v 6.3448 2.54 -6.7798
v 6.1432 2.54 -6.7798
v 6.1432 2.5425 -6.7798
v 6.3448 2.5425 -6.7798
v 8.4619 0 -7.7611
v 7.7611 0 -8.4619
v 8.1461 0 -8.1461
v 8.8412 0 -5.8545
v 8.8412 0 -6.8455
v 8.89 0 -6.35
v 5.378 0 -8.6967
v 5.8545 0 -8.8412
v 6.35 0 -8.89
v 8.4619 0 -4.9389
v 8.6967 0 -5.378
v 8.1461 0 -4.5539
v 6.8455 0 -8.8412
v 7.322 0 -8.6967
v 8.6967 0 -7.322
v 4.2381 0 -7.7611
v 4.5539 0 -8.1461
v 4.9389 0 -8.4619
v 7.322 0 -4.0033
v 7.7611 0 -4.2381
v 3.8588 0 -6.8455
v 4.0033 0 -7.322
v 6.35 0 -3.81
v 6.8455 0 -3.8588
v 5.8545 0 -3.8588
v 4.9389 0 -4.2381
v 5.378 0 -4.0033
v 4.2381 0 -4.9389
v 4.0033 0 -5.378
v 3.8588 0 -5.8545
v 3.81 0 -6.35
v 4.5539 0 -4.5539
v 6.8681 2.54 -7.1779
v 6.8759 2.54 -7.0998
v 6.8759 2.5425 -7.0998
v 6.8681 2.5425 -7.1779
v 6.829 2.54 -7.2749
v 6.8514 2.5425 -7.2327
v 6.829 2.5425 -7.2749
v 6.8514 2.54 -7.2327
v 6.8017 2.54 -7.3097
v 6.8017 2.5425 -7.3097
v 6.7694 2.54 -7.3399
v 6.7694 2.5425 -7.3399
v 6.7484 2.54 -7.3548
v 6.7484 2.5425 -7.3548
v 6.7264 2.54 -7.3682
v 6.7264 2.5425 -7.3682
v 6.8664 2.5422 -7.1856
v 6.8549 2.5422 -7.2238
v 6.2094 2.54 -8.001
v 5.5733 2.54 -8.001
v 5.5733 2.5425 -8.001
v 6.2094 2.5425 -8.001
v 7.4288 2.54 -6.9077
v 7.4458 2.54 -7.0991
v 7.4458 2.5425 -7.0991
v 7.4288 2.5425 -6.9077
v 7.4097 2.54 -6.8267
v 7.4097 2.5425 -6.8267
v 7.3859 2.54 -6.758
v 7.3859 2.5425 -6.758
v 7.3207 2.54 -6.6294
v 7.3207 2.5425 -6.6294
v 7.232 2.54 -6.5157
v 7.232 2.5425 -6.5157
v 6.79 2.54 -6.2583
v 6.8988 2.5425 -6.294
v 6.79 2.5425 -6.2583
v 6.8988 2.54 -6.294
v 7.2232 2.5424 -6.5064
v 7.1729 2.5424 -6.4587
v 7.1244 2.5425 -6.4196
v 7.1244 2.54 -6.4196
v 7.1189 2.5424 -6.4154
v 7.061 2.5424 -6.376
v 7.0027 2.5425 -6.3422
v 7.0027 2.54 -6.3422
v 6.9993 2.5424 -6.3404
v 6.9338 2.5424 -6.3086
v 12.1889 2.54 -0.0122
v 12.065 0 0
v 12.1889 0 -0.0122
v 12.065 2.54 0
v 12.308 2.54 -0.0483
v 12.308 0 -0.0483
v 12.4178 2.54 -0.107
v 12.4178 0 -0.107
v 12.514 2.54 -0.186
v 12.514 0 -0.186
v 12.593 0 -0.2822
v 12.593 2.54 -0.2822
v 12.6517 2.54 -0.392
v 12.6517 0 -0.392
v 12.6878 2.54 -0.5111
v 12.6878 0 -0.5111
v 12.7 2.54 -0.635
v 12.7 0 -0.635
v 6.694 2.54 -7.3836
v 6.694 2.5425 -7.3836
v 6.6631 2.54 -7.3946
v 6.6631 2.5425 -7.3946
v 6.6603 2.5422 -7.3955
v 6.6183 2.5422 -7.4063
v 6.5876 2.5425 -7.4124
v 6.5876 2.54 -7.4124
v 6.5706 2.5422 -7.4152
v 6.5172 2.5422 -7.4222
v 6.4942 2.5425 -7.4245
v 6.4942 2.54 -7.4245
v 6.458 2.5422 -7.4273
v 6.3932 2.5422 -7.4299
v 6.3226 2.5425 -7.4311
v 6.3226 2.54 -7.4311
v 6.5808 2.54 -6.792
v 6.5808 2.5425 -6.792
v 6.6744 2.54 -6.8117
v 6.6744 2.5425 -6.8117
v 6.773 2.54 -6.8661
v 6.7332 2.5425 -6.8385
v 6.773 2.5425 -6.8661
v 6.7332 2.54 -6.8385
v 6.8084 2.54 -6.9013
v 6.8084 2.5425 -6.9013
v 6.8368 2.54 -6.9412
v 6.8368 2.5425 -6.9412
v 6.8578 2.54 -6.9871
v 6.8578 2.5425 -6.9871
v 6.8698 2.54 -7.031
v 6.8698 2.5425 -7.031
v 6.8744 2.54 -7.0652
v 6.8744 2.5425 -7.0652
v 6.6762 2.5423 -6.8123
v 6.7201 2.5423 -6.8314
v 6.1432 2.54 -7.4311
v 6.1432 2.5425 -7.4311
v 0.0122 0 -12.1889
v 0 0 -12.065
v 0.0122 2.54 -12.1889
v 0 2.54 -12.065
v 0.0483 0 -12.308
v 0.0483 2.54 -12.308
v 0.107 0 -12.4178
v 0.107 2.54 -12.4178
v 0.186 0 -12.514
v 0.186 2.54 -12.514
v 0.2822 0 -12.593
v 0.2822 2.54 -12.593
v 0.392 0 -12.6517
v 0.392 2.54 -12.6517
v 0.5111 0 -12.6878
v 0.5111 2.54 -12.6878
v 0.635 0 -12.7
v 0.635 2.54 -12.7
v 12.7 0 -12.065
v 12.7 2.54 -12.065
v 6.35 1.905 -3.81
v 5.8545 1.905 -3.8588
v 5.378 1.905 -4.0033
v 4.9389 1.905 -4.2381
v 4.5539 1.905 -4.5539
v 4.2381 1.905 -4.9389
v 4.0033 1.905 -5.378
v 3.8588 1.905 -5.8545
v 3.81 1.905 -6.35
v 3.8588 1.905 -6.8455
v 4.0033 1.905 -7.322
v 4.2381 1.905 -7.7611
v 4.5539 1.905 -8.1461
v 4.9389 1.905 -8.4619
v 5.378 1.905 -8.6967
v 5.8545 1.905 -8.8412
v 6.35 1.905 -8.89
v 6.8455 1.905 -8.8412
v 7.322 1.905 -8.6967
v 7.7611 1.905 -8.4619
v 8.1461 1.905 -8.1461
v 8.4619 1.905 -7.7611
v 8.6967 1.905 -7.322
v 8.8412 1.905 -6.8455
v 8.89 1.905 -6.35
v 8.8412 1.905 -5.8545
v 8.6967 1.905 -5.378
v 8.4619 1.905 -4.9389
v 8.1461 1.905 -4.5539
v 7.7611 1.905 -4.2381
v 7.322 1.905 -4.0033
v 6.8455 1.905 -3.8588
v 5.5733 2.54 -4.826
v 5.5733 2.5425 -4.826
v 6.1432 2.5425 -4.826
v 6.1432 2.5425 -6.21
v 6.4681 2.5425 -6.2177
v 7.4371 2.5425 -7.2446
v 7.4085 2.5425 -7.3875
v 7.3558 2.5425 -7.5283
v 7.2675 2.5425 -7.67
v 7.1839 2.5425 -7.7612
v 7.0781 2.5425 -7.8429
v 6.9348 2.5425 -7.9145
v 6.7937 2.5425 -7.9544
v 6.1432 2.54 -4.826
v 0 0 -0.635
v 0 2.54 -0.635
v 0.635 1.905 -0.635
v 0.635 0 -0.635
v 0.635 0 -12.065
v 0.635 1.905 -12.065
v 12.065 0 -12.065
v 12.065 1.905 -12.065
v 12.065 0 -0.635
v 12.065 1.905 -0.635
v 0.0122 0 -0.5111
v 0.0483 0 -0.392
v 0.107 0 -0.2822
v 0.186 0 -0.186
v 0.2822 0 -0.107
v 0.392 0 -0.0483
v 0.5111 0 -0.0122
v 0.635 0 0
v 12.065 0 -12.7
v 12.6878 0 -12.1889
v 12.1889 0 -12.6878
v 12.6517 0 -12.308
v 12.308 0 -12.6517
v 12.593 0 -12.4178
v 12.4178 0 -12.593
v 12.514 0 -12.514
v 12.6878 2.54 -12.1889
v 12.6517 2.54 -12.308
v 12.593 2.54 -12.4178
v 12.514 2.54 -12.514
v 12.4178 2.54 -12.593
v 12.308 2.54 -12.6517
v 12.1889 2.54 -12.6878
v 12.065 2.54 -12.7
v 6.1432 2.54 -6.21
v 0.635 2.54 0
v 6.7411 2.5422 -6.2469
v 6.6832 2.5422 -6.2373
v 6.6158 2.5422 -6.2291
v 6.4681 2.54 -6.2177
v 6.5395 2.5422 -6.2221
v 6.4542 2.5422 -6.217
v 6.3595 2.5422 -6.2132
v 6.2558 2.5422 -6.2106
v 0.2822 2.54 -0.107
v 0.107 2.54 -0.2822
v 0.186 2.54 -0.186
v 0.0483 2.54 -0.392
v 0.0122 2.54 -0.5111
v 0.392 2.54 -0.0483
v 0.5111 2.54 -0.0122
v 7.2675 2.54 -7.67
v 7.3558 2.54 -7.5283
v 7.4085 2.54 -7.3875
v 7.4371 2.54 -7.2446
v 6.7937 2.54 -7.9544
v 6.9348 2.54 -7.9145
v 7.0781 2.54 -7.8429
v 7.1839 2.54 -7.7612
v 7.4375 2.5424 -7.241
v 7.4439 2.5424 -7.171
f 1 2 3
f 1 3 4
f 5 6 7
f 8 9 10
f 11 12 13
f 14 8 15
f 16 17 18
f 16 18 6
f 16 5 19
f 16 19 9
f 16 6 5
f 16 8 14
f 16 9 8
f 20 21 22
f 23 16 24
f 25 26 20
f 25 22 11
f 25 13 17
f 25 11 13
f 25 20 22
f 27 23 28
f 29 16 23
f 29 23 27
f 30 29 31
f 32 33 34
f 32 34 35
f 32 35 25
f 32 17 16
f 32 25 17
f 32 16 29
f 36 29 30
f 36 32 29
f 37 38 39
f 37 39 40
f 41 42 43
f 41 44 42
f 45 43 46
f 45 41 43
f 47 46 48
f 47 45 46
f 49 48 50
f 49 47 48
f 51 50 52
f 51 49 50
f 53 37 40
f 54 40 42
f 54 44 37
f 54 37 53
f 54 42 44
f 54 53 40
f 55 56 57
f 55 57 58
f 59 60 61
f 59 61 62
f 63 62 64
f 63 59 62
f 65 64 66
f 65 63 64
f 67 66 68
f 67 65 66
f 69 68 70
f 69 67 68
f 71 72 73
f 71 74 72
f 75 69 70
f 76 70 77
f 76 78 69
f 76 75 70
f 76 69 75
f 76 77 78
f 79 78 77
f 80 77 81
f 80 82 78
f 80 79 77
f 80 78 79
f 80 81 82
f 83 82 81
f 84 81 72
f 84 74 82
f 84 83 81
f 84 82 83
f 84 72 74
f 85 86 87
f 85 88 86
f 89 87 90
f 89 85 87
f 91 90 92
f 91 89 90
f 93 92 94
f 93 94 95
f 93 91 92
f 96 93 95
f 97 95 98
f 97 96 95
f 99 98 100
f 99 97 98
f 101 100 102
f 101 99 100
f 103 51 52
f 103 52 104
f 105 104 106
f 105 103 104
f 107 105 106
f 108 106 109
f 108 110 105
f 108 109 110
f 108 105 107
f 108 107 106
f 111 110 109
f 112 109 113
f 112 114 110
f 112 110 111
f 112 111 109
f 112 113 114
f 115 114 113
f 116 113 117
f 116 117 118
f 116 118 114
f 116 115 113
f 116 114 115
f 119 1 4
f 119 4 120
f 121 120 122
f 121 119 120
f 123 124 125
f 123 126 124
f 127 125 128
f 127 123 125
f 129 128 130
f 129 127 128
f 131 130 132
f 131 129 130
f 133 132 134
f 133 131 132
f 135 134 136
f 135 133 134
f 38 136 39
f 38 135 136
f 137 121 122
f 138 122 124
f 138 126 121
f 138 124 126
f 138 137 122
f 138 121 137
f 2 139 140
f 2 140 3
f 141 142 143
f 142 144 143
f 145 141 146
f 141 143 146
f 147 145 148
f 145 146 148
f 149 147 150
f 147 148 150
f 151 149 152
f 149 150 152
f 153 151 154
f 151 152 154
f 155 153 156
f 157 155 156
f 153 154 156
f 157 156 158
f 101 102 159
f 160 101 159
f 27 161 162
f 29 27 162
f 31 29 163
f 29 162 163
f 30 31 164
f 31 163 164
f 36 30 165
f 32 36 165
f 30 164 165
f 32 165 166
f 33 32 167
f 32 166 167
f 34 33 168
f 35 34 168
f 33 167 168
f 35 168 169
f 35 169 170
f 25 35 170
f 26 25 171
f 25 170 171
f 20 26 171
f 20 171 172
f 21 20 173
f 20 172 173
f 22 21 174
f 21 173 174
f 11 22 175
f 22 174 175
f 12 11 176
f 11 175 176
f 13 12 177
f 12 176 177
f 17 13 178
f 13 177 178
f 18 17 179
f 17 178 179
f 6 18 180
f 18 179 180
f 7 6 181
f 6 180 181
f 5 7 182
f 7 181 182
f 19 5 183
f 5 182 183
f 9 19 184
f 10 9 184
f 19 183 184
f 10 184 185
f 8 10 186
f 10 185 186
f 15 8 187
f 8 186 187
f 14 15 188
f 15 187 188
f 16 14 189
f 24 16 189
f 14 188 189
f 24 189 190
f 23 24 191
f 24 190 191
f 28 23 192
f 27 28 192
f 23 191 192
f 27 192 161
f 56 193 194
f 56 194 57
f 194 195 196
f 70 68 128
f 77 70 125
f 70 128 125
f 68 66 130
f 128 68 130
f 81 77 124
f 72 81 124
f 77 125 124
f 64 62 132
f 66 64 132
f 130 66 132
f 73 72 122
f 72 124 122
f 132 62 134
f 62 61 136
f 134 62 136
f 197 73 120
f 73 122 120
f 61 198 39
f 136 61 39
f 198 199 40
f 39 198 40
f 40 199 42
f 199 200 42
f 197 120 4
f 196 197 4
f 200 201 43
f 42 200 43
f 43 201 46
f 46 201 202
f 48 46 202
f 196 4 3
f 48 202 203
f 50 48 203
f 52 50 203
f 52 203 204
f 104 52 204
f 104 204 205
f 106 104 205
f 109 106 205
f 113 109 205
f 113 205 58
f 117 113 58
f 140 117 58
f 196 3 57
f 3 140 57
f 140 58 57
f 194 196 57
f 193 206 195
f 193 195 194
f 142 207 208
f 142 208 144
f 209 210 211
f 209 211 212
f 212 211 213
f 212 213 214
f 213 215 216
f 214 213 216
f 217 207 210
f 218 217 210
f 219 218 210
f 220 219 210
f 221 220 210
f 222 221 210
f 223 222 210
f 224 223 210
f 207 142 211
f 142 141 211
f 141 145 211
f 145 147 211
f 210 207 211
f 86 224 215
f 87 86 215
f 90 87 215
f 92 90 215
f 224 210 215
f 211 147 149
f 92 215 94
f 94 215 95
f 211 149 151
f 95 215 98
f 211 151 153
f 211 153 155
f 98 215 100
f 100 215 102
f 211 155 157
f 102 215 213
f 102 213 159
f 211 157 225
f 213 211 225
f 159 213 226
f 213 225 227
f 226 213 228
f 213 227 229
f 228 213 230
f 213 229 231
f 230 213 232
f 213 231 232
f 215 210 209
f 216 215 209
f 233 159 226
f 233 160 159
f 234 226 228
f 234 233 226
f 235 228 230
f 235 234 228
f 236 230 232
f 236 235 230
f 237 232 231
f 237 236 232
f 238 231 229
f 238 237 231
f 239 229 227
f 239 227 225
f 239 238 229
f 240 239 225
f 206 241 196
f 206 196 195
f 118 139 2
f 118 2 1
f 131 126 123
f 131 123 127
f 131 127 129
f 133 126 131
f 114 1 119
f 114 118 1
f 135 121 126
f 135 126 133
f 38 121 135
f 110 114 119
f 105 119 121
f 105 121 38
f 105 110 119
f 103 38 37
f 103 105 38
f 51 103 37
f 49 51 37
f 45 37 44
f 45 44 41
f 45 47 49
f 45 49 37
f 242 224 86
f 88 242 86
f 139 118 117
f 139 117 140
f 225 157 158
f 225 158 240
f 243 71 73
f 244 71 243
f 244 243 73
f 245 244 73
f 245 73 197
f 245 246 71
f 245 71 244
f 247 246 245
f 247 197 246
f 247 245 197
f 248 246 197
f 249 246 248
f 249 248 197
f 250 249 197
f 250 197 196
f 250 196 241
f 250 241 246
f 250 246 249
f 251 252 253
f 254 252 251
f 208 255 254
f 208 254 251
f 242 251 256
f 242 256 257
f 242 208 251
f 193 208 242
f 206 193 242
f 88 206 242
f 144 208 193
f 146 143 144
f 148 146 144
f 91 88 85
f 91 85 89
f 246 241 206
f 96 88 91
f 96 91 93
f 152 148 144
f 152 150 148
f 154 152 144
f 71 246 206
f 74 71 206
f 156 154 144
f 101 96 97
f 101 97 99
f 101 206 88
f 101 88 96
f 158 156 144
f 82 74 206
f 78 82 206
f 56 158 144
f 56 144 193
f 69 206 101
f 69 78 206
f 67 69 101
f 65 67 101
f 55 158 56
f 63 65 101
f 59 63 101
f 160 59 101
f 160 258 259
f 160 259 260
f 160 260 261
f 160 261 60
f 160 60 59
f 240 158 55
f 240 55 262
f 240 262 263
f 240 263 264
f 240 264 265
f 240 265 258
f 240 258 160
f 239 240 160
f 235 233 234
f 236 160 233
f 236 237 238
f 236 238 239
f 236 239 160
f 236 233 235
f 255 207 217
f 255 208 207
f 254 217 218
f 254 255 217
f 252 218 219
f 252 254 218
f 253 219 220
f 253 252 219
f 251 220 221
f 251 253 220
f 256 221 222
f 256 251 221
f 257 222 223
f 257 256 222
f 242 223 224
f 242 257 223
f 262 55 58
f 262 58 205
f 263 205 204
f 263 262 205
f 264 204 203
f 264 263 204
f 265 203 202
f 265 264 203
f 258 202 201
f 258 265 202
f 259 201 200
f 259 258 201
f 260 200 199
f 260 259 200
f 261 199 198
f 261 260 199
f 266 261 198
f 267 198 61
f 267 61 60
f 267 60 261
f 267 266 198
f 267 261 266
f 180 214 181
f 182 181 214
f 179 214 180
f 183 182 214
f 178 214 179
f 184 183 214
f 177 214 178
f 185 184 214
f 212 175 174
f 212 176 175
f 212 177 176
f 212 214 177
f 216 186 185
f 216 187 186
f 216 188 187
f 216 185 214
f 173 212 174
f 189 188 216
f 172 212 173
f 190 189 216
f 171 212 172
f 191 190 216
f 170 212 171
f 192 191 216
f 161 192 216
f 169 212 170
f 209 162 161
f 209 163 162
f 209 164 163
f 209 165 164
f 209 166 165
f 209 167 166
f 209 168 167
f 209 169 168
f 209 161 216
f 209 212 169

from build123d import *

# Parameters (mm, degrees)
SKETCH1_W           = 12.7
SKETCH1_H           = 12.7
BOSS_EXTRUDE1_DEPTH = 2.54
FILLET1_R           = 0.635
SHELL1_START        = 0.635
SHELL1_OUTLINE_W    = 1.905
SHELL1_OUTLINE_H    = 11.43
SHELL1_DEPTH        = 11.43
SKETCH2_R           = 2.54
BOSS_EXTRUDE2_DEPTH = 1.905
BOSS_EXTRUDE3_DEPTH = 0.00254


# Read off the part's stored shape, not the designer's step: Shell1
with BuildPart() as part:
    # Sketch1 → Boss-Extrude1 (new body)
    with BuildSketch(Plane(origin=(0, 0, 0), x_dir=(1, 0, 0), z_dir=(0, 1, 0))):
        with Locations((6.35, 6.35)):
            Rectangle(SKETCH1_W, SKETCH1_H)
    extrude(amount=BOSS_EXTRUDE1_DEPTH)

    # Fillet1
    fillet1_edges = [part.edges().sort_by_distance(p)[0] for p in [
        (0, 1.27, -12.7),
        (12.7, 1.27, -12.7),
        (12.7, 1.27, 0),
        (0, 1.27, 0),
    ]]
    fillet(fillet1_edges, radius=FILLET1_R)

    # Shell1 outline → Shell1 (cut)
    with BuildSketch(Plane.YZ.offset(SHELL1_START)):
        with Locations((0.9525, -6.35)):
            Rectangle(SHELL1_OUTLINE_W, SHELL1_OUTLINE_H)
    extrude(amount=SHELL1_DEPTH, mode=Mode.SUBTRACT)

    # Sketch2 → Boss-Extrude2 (add)
    with BuildSketch(Plane(origin=(0, 1.905, 0), x_dir=(-1, 0, 0), z_dir=(0, -1, 0))):
        with Locations(Location((-6.35, 6.35, 0), (0, 0, 270))):
            Circle(SKETCH2_R)
    extrude(amount=BOSS_EXTRUDE2_DEPTH)

    # Sketch3 → Boss-Extrude3 (add)
    with BuildSketch(Plane(origin=(0, 2.54, 0), x_dir=(1, 0, 0), z_dir=(0, 1, 0))):
        with BuildLine():
            Line((5.573346154, 8.001), (6.209363782, 8.001))
            add(Edge.make_bspline(
                [(6.209363782, 8.001), (6.250920349, 8.000813984), (6.331091677, 8.00045512), (6.446705328, 7.996103418), (6.553364582, 7.988304902), (6.651044933, 7.978667169), (6.739706219, 7.965155443), (6.81945947, 7.949665308), (6.890321237, 7.930793814), (6.95309059, 7.908393613), (7.009424058, 7.88198465), (7.062733687, 7.85385722), (7.111814675, 7.820288125), (7.159144287, 7.784895298), (7.202016608, 7.744297677), (7.243106269, 7.701197093), (7.280673012, 7.653884211), (7.314890906, 7.602931741), (7.345931809, 7.549281068), (7.373051219, 7.492836279), (7.395048965, 7.433508057), (7.413502339, 7.371680187), (7.428324268, 7.307355365), (7.438190216, 7.240137987), (7.444891665, 7.17049739), (7.445482975, 7.123099955), (7.445782051, 7.099127003)],
                knots=[0, 0, 0, 0, 1.698747864, 3.27724071, 4.728299578, 6.070144658, 7.288476769, 8.393259625, 9.389771311, 10.283485332, 11.113357557, 11.931608583, 12.74405601, 13.541433047, 14.344816069, 15.154114104, 15.974336324, 16.810834471, 17.661136416, 18.50621059, 19.367396281, 20.244825668, 21.142564693, 22.063065223, 23.020325768, 24, 24, 24, 24], degree=3))
            add(Edge.make_bspline(
                [(7.445782051, 7.099127003), (7.445349325, 7.072606297), (7.444498965, 7.02048985), (7.436162698, 6.944093533), (7.421921719, 6.871256561), (7.403309504, 6.801364688), (7.377356095, 6.735567789), (7.347705543, 6.672295931), (7.31122596, 6.613323062), (7.269542204, 6.557911502), (7.224018788, 6.50561073), (7.173574986, 6.457930831), (7.11917228, 6.414546773), (7.061125587, 6.375003888), (6.999216983, 6.339381942), (6.933491138, 6.307347374), (6.863499238, 6.279924749), (6.814758985, 6.265582938), (6.790047877, 6.258311699)],
                knots=[0, 0, 0, 0, 1.102006807, 2.165578795, 3.188629044, 4.184801286, 5.166646146, 6.124351954, 7.085497154, 8.042432466, 9.003981491, 9.963833307, 10.922997304, 11.89326795, 12.880200226, 13.889073926, 14.929769137, 16, 16, 16, 16], degree=3))
            add(Edge.make_bspline(
                [(6.790047877, 6.258311699), (6.773771719, 6.254262164), (6.738512321, 6.245489569), (6.680167701, 6.236583183), (6.612931652, 6.228394308), (6.536586757, 6.221356962), (6.451089, 6.216573206), (6.356521166, 6.212837306), (6.252840398, 6.210120921), (6.180744892, 6.210024531), (6.143217949, 6.209974359)],
                knots=[0, 0, 0, 0, 0.618981996, 1.340914327, 2.176866532, 3.120127938, 4.170906482, 5.338178032, 6.614476169, 8, 8, 8, 8], degree=3))
            Line((6.143217949, 6.209974359), (6.143217949, 4.826))
            Line((6.143217949, 4.826), (5.573346154, 4.826))
            Line((5.573346154, 4.826), (5.573346154, 8.001))
        make_face()
        with BuildLine():
            Line((6.143217949, 6.779846154), (6.344835537, 6.779846154))
            add(Edge.make_bspline(
                [(6.344835537, 6.779846154), (6.38152304, 6.780078781), (6.449028591, 6.780506819), (6.541217335, 6.786696491), (6.615301984, 6.796149371), (6.673830231, 6.809706987), (6.720043827, 6.830282464), (6.759900159, 6.854084417), (6.794085953, 6.884181333), (6.823685819, 6.918572209), (6.84735002, 6.958089049), (6.863759911, 7.002088399), (6.874419453, 7.049645784), (6.875403961, 7.082742577), (6.875910256, 7.099763021)],
                knots=[0, 0, 0, 0, 1.8619151, 3.425951444, 4.686033666, 5.651700536, 6.461346321, 7.243864085, 7.999046032, 8.762387399, 9.539336099, 10.322741239, 11.137448474, 12, 12, 12, 12], degree=3))
            add(Edge.make_bspline(
                [(6.875910256, 7.099763021), (6.875409169, 7.114633561), (6.874436938, 7.143485985), (6.867294669, 7.185127188), (6.855911946, 7.22394538), (6.839418817, 7.259535156), (6.818097108, 7.291836043), (6.792101629, 7.320835316), (6.761765954, 7.34715402), (6.73834504, 7.361084912), (6.726446114, 7.36816246)],
                knots=[0, 0, 0, 0, 1.102301479, 2.1387299, 3.123554645, 4.094223062, 5.036071848, 5.982632524, 6.975082478, 8, 8, 8, 8], degree=3))
            add(Edge.make_bspline(
                [(6.726446114, 7.36816246), (6.716367037, 7.373259738), (6.695027566, 7.384051721), (6.658684377, 7.39659819), (6.616744892, 7.407182518), (6.568925973, 7.415967409), (6.515418382, 7.422785396), (6.456231666, 7.427999451), (6.391278727, 7.430096225), (6.346107844, 7.430774724), (6.32257492, 7.431128205)],
                knots=[0, 0, 0, 0, 0.656809284, 1.390599849, 2.23162475, 3.173112763, 4.218524733, 5.370385145, 6.63003504, 8, 8, 8, 8], degree=3))
            Line((6.32257492, 7.431128205), (6.143217949, 7.431128205))
            Line((6.143217949, 7.431128205), (6.143217949, 6.779846154))
        make_face(mode=Mode.SUBTRACT)
    extrude(amount=BOSS_EXTRUDE3_DEPTH)


solid = part.part
